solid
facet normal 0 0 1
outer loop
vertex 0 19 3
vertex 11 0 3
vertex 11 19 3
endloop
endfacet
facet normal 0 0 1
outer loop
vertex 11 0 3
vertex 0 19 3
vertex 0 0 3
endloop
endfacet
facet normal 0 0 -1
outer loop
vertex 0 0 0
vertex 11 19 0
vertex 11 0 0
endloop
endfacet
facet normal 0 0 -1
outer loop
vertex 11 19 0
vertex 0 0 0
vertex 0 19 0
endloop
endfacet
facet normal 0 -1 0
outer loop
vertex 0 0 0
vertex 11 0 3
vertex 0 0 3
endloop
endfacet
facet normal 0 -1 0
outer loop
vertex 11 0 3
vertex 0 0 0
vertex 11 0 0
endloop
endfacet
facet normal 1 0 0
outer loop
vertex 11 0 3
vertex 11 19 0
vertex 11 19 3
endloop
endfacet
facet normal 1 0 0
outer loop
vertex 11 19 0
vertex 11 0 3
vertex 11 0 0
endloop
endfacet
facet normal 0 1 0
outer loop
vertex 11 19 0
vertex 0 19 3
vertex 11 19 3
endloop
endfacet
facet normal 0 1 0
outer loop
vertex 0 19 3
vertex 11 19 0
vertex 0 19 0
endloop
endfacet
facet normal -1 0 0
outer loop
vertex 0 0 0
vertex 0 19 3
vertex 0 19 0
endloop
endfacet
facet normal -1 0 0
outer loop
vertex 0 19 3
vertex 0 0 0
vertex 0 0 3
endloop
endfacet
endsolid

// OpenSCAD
// Generated by SolidPython 1.0.1 on 2020-07-29 00:46:55


cube(size = [11, 19, 3]);
/***********************************************
*********      SolidPython code:      **********
************************************************
 
# import packages: SolidPython
from solid import *
from solid.utils import *
from itertools import chain, combinations, permutations


class Resize:

    def __init__(self, scad_file):
        self.scad_file = scad_file
        #self.scad_file = import_scad(scad_file)
        # cone/cylinder param:
        self.r1 = 0
        self.r2 = 0
        self.h = 0
        # rectangular prism param:
        self.w = 0
        self.l = 0
        # ellipse param:
        self.r = 0

    # import OpenScad code (file name corresponds to shape)


    # classify shape + parameters
    def assign(self, param1, param2, param3):
        if self.scad_file == 'cone.scad':
            self.r1 = param1
            self.r2 = param2
            self.h = param3
        elif self.scad_file == 'cylinder.scad':
            self.r1 = param1
            self.r2 = param2
            self.h = param3
        elif self.scad_file == 'rectangularPrism.scad':
            self.h = param1
            self.l = param2
            self.w = param3
        else:
            self.r = param1
            self.h = param2

    # resize parameters
    def iterate(self):
        x = range(3, 20, 2)
        i = 1
        if self.scad_file == 'cone.scad':
            tempList = list(permutations(x, 2))
            for temp in tempList:
                param1 = temp[0]
                param2 = temp[1]
                filepath = 'produced_scad_files/' + 'cone' + str(param1) + '_' + str(param2) + '_' + '.scad'
                scad_render_to_file(cylinder(h=param1, r1=param2, r2=0), filepath)

        elif self.scad_file == 'cylinder.scad':
            tempList = list(permutations(x, 3))
            for temp in tempList:
                param1 = temp[0]
                param2 = temp[1]
                filepath = 'produced_scad_files/' + 'cylinder' + str(param1) + '_' + str(param2) + '_' + '.scad'
                scad_render_to_file(cylinder(h=param1, r1=param2, r2=param2), filepath)

        elif self.scad_file == 'rectangularPrism.scad':
            tempList = list(permutations(x, 3))
            for temp in tempList:
                param1 = temp[0]
                param2 = temp[1]
                param3 = temp[2]
                filepath = 'produced_scad_files/' + 'rectangularPrism' + str(param1) + '_' + str(param2) + '_' + str(
                    param3) + '.scad'
                scad_render_to_file(cube(size=(param1, param2, param3)), filepath)

        elif self.scad_file == 'ellipse.scad':
            tempList = list(permutations(x, 4))
            for temp in tempList:
                param1 = temp[0]
                param2 = temp[1]
                param3 = temp[2]
                param4 = temp[3]
                filepath = 'produced_scad_files/' + 'ellipse' + str(param1) + '_' + str(param2) + '_' + str(param3) + '_' + str(param4) + '.scad'
                scad_render_to_file(scale([param1, param2, param3])(sphere(r=param4)), filepath)

    def render_to_scadfile(self):
        scad_render_to_file(scad, 'example.scad') 
 
************************************************/
